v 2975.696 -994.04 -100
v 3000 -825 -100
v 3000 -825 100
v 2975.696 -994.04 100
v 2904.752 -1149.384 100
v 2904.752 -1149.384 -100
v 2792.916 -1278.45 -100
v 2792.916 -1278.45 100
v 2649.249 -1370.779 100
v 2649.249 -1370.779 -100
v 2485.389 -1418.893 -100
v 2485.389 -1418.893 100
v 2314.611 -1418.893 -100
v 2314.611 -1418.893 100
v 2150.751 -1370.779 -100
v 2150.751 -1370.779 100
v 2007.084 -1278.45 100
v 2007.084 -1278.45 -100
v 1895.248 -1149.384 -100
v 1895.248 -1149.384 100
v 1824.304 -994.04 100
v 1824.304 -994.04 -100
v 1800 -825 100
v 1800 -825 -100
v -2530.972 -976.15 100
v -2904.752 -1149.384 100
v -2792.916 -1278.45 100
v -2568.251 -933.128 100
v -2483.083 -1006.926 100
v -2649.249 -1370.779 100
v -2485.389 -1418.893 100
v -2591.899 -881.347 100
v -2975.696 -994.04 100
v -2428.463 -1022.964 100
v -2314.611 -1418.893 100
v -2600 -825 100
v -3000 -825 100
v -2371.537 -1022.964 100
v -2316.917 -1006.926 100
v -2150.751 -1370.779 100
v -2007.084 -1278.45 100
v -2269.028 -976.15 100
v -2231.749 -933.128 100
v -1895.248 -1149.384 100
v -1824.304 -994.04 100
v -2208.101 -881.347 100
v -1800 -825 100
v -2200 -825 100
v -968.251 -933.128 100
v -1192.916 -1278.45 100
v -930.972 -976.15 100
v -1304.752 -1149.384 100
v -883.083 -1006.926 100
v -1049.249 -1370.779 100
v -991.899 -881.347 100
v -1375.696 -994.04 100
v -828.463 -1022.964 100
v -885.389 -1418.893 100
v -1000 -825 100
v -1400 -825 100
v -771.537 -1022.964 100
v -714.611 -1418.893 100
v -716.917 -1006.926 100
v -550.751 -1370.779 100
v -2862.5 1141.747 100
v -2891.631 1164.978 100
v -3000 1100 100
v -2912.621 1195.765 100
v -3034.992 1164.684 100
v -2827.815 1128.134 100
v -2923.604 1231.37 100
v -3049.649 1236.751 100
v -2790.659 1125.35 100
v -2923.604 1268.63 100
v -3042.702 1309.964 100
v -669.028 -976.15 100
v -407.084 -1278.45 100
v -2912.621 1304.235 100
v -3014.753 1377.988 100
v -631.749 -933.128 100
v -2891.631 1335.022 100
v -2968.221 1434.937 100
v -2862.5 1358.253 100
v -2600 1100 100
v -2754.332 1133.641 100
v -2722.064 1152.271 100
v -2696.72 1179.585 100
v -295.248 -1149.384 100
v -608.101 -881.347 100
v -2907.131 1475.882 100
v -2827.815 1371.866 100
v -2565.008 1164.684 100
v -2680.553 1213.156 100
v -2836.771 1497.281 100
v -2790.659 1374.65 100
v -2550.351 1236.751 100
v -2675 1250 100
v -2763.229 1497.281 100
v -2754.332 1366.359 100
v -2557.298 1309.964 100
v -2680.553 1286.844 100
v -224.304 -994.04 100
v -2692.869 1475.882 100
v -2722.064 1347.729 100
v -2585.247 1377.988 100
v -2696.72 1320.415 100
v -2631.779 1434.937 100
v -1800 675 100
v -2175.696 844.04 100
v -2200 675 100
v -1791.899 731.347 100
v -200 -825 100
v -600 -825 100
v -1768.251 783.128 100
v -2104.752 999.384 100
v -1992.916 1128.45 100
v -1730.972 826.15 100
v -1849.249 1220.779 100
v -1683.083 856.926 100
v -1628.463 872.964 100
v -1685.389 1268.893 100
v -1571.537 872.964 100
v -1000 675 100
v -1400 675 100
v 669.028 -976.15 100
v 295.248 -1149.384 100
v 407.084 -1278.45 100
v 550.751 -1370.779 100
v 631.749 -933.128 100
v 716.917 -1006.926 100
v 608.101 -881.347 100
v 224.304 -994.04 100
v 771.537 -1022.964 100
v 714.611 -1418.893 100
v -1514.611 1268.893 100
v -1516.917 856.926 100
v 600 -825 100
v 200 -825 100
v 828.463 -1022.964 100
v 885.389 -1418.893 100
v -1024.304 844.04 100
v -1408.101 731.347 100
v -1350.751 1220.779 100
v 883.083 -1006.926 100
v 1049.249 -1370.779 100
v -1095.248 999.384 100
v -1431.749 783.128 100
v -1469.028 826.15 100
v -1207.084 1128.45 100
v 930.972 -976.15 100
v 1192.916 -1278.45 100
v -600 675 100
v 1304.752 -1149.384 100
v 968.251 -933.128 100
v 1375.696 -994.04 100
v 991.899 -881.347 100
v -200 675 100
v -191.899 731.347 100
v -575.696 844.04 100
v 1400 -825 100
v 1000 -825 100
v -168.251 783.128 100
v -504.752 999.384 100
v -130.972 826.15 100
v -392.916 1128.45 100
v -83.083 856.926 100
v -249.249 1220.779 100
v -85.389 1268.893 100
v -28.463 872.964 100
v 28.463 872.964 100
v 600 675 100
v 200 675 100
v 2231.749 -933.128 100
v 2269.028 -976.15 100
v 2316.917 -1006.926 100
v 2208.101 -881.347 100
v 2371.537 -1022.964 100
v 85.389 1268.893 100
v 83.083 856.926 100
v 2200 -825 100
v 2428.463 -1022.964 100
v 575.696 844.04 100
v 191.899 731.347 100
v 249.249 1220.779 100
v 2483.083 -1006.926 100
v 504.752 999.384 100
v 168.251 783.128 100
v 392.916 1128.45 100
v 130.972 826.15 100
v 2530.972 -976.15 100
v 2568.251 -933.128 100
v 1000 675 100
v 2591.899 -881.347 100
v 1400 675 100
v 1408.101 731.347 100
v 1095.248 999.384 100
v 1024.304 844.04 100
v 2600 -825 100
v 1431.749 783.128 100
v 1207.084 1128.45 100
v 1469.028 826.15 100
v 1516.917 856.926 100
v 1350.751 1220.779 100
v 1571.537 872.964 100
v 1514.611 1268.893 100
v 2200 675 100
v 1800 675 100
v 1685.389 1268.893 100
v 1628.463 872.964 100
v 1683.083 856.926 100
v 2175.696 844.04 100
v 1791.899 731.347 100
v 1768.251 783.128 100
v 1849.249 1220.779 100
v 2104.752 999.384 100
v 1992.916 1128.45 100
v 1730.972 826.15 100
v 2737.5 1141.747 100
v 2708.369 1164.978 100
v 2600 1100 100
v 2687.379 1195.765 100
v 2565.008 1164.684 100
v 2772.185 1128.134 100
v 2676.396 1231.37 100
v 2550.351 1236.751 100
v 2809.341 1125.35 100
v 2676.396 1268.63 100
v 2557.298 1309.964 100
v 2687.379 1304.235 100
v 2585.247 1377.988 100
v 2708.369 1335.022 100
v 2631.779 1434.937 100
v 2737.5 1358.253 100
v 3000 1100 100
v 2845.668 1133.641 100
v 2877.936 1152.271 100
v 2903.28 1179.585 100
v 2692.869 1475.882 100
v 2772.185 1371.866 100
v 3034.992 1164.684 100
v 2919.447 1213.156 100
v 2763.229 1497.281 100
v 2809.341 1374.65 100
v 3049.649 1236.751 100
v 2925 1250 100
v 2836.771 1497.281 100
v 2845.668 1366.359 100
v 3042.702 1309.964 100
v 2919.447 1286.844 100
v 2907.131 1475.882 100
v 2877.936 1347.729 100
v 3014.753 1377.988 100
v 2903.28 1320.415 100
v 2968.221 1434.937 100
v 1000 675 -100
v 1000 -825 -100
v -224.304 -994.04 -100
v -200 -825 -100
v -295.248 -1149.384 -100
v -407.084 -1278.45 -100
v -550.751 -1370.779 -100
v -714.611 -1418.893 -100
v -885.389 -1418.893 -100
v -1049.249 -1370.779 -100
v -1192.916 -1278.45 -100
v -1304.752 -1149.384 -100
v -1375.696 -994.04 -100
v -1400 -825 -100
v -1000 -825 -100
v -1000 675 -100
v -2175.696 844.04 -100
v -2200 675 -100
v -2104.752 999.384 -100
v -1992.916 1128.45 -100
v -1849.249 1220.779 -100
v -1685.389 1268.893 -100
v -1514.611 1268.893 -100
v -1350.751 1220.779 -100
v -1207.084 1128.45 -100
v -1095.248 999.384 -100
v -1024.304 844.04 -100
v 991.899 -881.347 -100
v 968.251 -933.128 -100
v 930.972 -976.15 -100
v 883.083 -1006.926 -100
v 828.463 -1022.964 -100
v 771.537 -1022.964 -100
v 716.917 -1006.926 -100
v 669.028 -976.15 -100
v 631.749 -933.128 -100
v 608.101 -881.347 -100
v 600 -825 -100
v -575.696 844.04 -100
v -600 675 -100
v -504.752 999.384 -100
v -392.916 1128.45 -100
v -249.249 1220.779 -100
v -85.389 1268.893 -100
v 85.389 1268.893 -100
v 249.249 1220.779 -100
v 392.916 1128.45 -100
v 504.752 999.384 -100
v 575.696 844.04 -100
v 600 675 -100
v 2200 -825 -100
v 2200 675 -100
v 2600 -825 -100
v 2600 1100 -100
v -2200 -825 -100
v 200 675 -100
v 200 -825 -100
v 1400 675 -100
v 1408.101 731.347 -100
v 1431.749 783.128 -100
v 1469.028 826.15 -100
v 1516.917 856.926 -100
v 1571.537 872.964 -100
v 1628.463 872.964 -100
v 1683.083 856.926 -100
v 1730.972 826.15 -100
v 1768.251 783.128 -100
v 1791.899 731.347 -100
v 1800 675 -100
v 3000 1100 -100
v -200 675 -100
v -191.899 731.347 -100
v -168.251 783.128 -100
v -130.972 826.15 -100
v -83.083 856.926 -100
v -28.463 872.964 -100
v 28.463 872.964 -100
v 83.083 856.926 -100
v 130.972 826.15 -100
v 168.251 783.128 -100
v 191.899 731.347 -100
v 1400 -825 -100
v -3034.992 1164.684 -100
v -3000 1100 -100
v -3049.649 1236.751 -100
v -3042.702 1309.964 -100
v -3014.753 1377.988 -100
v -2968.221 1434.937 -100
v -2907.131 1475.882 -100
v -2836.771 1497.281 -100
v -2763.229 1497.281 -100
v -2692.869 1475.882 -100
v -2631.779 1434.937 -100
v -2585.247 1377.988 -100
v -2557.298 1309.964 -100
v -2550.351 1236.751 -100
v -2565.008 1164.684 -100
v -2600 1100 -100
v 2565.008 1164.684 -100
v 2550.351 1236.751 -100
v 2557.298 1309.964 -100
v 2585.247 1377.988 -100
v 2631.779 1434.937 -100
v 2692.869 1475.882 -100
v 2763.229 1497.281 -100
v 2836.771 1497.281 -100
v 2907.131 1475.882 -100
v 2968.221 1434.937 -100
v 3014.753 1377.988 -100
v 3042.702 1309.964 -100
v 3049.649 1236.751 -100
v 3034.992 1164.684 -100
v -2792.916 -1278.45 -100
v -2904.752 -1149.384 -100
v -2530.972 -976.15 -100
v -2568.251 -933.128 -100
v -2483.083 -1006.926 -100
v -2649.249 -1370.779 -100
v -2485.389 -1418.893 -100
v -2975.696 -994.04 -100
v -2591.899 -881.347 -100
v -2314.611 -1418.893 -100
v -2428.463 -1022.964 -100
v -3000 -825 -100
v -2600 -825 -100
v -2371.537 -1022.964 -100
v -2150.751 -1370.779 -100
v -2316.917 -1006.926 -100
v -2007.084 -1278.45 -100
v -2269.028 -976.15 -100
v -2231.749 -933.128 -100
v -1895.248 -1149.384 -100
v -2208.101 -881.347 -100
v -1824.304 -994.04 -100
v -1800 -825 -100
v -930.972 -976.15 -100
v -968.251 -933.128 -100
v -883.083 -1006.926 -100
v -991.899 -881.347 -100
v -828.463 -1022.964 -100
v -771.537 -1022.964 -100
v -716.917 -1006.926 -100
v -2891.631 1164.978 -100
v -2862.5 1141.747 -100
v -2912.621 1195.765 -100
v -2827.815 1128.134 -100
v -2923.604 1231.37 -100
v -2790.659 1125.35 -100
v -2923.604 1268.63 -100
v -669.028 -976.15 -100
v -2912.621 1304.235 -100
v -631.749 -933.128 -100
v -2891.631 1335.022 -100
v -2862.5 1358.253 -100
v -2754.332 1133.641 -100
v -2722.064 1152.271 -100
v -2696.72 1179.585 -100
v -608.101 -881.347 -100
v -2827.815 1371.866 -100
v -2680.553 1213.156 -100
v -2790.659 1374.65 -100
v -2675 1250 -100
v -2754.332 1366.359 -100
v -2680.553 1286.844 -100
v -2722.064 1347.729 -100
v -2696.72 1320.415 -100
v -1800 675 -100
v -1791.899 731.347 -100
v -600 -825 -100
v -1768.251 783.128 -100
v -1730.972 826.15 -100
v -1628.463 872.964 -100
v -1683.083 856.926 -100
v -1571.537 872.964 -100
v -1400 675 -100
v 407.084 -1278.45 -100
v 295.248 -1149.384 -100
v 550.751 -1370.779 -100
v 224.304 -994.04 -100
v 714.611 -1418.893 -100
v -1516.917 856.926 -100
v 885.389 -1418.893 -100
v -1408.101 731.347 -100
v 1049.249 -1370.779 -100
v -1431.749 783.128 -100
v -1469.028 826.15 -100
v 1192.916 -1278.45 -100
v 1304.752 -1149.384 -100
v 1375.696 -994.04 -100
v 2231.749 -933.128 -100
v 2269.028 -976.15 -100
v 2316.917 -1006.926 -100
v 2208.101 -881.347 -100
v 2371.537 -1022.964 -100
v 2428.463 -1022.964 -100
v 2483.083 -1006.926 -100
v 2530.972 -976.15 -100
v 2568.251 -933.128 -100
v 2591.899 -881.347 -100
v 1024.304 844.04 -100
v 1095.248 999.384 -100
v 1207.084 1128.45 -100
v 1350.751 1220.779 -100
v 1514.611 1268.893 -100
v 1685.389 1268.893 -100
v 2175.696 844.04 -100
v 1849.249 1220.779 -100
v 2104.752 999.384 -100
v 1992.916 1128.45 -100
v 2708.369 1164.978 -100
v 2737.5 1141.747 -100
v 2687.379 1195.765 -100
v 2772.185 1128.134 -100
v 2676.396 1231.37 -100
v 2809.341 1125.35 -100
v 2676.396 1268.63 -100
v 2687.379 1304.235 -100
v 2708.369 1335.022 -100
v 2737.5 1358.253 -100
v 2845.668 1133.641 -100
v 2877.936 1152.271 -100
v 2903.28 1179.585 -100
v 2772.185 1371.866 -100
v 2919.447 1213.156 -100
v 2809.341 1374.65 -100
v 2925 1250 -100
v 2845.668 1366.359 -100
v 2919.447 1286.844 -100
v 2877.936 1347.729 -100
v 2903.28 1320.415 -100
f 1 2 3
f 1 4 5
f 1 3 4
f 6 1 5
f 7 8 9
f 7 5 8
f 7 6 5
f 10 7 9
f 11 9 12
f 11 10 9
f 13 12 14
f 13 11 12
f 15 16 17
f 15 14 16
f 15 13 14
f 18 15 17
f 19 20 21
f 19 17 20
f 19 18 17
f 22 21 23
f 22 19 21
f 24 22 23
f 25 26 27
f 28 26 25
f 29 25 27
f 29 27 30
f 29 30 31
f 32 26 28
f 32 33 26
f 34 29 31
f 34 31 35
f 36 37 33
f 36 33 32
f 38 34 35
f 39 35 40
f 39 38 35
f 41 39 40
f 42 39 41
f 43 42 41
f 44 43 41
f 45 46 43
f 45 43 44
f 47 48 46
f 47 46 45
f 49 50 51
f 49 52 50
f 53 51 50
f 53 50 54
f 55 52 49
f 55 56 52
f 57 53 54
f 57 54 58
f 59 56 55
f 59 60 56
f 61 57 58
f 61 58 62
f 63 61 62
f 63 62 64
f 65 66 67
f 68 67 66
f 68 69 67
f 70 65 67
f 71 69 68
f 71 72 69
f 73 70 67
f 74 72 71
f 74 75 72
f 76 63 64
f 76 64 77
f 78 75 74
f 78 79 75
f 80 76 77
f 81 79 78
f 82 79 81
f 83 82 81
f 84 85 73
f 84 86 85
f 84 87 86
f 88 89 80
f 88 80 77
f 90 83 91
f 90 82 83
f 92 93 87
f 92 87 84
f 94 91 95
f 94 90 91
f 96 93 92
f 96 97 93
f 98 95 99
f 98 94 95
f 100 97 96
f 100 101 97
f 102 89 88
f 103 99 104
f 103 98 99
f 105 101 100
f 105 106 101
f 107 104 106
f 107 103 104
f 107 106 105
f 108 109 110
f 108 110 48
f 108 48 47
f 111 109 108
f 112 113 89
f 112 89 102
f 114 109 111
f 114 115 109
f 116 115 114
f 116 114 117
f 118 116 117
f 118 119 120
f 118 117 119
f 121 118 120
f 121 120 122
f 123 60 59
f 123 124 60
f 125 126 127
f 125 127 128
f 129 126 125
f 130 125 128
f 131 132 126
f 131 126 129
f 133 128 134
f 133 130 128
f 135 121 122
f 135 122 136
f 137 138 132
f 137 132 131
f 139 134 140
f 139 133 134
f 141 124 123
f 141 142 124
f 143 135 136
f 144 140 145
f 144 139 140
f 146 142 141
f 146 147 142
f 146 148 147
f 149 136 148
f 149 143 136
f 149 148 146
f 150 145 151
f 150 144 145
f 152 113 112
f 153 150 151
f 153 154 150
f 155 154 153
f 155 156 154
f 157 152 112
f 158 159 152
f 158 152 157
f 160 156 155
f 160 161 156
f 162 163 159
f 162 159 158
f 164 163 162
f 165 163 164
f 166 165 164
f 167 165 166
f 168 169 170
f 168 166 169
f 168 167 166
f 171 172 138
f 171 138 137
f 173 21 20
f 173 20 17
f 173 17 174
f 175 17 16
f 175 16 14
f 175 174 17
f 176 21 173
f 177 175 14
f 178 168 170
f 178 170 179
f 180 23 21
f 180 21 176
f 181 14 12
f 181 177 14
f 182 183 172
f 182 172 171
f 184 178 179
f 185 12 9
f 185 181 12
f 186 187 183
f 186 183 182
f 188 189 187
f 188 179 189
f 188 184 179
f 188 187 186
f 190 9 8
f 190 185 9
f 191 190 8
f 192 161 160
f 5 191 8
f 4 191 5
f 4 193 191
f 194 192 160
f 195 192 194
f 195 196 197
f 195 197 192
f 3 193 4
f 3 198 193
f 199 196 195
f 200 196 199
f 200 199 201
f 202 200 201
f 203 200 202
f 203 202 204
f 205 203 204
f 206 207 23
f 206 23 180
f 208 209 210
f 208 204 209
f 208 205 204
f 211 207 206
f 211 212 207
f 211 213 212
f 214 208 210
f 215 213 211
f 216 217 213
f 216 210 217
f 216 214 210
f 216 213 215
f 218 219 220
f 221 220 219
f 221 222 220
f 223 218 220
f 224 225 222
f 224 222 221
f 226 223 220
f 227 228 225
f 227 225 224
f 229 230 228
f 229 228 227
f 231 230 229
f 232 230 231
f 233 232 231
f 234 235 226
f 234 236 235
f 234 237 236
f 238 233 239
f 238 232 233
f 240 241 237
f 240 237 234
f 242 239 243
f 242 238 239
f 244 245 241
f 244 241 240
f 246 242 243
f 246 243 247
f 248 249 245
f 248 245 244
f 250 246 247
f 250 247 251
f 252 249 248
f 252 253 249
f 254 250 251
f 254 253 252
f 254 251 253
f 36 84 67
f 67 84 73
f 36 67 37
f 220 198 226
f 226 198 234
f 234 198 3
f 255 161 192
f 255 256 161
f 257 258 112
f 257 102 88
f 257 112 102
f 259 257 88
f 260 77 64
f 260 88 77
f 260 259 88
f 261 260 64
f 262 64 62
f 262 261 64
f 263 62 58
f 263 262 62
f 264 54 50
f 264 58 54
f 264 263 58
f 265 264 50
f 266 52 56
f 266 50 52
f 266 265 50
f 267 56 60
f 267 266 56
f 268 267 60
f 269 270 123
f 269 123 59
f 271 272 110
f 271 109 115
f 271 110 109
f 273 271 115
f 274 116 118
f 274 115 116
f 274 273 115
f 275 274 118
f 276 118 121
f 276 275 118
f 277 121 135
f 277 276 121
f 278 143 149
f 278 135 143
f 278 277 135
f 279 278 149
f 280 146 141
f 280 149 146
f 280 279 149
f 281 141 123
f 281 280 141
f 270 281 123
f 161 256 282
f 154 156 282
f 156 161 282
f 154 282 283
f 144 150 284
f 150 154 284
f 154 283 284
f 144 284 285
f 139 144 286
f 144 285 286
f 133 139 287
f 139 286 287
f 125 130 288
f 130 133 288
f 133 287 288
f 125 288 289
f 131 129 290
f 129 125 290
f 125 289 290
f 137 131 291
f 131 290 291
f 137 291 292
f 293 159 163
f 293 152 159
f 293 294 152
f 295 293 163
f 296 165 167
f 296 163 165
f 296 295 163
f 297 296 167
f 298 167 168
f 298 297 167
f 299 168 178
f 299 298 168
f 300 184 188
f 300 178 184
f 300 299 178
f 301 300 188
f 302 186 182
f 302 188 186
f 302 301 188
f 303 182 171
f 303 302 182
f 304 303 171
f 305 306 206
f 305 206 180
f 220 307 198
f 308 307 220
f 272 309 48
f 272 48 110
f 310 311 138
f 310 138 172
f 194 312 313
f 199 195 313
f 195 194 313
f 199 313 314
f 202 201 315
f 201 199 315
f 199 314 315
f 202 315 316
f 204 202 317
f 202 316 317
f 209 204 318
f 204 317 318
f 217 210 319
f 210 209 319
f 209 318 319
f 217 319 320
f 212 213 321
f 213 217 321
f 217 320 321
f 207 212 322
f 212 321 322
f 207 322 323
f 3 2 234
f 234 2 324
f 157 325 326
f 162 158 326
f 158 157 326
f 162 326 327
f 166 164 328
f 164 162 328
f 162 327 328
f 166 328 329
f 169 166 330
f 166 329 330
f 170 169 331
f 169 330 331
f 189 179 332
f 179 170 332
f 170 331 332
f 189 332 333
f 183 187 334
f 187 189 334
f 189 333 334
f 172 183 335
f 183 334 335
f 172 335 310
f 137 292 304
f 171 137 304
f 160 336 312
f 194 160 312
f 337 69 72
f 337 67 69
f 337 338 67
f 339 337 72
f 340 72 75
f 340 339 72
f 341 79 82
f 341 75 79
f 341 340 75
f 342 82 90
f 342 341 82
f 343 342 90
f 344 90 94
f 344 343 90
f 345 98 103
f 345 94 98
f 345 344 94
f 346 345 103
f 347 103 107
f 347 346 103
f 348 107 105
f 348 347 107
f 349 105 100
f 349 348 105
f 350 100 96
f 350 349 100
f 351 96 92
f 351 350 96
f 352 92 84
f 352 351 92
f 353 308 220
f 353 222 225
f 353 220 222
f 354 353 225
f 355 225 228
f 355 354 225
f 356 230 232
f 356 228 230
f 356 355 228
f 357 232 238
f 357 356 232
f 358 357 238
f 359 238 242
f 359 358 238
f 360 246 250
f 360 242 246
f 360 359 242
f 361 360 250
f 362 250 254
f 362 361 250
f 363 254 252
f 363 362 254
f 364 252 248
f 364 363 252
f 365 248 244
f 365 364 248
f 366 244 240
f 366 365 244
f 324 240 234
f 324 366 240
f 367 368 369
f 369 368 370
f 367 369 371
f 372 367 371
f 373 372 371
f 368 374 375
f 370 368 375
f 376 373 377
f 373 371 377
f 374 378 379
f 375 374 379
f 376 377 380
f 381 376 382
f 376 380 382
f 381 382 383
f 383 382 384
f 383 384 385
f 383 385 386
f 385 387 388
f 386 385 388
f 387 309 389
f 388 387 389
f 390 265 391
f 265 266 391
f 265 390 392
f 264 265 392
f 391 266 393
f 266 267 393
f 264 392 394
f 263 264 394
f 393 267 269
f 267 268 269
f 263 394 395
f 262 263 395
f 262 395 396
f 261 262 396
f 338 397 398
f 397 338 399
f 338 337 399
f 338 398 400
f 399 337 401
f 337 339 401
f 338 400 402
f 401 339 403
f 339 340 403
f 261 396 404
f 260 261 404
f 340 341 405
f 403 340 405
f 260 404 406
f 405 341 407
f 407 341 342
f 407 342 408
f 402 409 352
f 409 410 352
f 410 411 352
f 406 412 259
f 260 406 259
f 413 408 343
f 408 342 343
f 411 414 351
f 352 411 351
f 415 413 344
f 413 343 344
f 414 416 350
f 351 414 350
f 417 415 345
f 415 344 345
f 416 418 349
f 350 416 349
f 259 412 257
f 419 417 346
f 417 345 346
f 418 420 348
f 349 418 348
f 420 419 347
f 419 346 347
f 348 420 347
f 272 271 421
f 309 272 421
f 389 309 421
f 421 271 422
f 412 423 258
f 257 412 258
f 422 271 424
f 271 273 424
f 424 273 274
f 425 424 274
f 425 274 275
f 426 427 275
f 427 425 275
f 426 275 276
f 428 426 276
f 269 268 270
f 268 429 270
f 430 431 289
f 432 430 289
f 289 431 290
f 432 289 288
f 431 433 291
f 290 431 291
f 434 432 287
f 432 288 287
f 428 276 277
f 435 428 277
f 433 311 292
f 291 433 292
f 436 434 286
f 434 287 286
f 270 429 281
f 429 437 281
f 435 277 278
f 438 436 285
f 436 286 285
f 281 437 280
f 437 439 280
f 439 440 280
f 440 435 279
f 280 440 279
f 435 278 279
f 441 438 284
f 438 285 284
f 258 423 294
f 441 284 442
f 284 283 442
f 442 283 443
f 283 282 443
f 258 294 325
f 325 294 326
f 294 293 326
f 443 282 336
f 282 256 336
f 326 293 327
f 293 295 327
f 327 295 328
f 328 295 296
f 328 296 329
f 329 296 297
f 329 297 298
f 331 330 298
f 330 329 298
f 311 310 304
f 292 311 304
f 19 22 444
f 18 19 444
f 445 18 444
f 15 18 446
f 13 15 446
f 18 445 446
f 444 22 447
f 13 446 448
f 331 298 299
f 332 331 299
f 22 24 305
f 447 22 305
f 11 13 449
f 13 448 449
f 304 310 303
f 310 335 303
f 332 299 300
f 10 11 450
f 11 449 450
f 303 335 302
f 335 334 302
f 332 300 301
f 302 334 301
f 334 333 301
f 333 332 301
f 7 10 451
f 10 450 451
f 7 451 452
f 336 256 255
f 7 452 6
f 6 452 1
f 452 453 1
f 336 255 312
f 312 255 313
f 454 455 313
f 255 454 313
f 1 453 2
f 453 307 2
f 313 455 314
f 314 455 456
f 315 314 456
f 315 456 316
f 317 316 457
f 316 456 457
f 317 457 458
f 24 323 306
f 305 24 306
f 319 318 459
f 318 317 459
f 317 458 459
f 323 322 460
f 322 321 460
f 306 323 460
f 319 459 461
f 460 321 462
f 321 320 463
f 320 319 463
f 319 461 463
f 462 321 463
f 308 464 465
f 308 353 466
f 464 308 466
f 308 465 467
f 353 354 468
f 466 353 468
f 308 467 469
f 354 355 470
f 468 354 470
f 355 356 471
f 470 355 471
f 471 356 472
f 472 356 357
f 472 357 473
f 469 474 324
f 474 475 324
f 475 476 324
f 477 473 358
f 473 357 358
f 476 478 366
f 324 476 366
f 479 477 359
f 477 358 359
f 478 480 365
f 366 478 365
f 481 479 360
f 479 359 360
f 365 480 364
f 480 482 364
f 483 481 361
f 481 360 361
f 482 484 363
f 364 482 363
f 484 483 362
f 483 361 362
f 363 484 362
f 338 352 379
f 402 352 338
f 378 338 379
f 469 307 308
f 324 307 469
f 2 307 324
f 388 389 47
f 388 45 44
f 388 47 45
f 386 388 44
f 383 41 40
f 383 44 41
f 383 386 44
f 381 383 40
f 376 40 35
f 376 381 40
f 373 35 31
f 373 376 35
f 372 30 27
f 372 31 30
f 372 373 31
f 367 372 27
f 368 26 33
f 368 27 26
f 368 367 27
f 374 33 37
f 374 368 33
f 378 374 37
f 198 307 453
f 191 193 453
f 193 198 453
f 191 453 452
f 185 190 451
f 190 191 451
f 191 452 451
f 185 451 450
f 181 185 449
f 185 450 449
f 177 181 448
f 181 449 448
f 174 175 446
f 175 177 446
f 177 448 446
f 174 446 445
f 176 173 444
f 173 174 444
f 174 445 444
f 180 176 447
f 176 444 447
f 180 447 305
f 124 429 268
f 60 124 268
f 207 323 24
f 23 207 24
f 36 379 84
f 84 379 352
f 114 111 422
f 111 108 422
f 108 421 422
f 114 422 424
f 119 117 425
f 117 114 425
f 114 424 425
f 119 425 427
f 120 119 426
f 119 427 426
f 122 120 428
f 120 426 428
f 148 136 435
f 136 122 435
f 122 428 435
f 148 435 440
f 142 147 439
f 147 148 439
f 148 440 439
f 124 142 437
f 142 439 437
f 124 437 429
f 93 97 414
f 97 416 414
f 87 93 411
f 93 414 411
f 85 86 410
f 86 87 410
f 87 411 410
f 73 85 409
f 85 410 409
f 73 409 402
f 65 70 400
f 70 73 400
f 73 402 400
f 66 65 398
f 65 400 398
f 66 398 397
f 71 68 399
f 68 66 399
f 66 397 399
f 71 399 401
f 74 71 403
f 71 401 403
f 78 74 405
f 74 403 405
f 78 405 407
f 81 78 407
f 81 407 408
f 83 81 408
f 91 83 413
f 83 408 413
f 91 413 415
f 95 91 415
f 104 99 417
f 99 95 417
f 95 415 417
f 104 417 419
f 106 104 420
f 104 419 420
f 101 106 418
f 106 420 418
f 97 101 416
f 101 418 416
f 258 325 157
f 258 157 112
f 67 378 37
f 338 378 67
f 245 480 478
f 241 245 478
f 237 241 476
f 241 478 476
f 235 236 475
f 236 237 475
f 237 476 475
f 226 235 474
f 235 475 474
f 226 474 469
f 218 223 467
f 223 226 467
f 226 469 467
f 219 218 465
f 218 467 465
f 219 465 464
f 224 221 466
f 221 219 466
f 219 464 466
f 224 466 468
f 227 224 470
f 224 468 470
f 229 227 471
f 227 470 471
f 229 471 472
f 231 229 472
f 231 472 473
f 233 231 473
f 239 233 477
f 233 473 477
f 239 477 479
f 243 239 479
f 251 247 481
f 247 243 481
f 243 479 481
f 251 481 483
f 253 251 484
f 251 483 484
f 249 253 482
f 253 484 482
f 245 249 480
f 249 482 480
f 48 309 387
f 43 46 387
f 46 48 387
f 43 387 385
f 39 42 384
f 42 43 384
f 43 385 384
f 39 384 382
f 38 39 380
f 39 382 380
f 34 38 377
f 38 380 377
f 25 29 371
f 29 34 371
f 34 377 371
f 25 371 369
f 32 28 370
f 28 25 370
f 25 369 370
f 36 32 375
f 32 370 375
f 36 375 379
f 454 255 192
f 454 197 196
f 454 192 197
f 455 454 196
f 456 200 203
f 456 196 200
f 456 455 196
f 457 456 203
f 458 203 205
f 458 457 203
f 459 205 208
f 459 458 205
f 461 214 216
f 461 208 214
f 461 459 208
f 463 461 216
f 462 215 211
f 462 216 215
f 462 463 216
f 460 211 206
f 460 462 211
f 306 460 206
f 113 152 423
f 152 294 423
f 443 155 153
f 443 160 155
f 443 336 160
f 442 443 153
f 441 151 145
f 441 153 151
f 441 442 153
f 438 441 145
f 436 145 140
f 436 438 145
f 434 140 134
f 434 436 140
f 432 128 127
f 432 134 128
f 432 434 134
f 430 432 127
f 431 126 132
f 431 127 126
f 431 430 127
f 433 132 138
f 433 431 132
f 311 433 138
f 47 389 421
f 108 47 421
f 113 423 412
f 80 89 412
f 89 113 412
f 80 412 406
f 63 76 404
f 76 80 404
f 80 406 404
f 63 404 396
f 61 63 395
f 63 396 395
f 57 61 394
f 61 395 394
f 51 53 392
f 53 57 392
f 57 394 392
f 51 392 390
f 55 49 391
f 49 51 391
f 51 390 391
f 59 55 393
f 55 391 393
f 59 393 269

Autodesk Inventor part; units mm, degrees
ref_plane "YZ Plane" through (0, 0, 0) normal (1, 0, 0) x (0, 1, 0)
ref_plane "XZ Plane" through (0, 0, 0) normal (0, 1, 0) x (-1, 0, 0)
ref_plane "XY Plane" through (0, 0, 0) normal (0, 0, 1) x (1, 0, 0)
sketch "Esboço1" plane through (0, 0, 0) normal (0, 0, 1) x (1, 0, 0)
  arc A0 (-2600, 1100) -> (-3000, 1100) centre (-2800, 1250) ccw
  line L0 (-2800, 1250) -> (-2800, -825) construction
  line L1 (-3000, -825) -> (-3000, 1100)
  line L2 (-2600, -825) -> (-2600, 1100)
  arc A1 (-2600, -825) -> (-2200, -825) centre (-2400, -825) ccw
  circle A2 centre (-2400, -825) radius 600 construction
  arc A3 (-3000, -825) -> (-1800, -825) centre (-2400, -825) ccw
  line L3 (-2200, -825) -> (-2200, 675)
  line L4 (-1800, -825) -> (-1800, 675)
  arc A4 (-1400, 675) -> (-1800, 675) centre (-1600, 675) ccw
  circle A5 centre (-1600, 675) radius 600 construction
  arc A6 (-1000, 675) -> (-2200, 675) centre (-1600, 675) ccw
  line L5 (-1400, 675) -> (-1400, -825)
  line L6 (-1000, 675) -> (-1000, -825)
  arc A7 (-1000, -825) -> (-600, -825) centre (-800, -825) ccw
  circle A8 centre (-800, -825) radius 600 construction
  arc A9 (-1400, -825) -> (-200, -825) centre (-800, -825) ccw
  line L7 (600, -825) -> (600, 675)
  line L8 (200, -825) -> (200, 675)
  arc A10 (200, 675) -> (-200, 675) centre (0, 675) ccw
  circle A11 centre (0, 675) radius 600 construction
  arc A12 (600, 675) -> (-600, 675) centre (0, 675) ccw
  line L9 (-200, 675) -> (-200, -825)
  line L10 (-600, 675) -> (-600, -825)
  circle A13 centre (800, -825) radius 600 construction
  arc A14 (600, -825) -> (1000, -825) centre (800, -825) ccw
  arc A15 (200, -825) -> (1400, -825) centre (800, -825) ccw
  line L11 (1000, -825) -> (1000, 675)
  line L12 (1400, -825) -> (1400, 675)
  circle A16 centre (1600, 675) radius 200 construction
  arc A17 (1800, 675) -> (1400, 675) centre (1600, 675) ccw
  circle A18 centre (1600, 675) radius 600 construction
  arc A19 (2200, 675) -> (1000, 675) centre (1600, 675) ccw
  line L13 (1800, 675) -> (1800, -825)
  line L14 (2200, 675) -> (2200, -825)
  arc A20 (2200, -825) -> (2600, -825) centre (2400, -825) ccw
  arc A21 (1800, -825) -> (3000, -825) centre (2400, -825) ccw
  arc A22 (3000, 1100) -> (2600, 1100) centre (2800, 1250) ccw
  line L15 (2800, 1250) -> (2800, -825) construction
  line L16 (3000, -825) -> (3000, 1100)
  line L17 (2600, -825) -> (2600, 1100)
  circle A23 centre (-2800, 1250) radius 125
  circle A24 centre (2800, 1250) radius 125
  circle A25 centre (2400, -825) radius 200 construction
  circle A26 centre (2400, -825) radius 600 construction
  point P0 (0, 0)
  point P1 (-600, 675)
  point P2 (-1000, 675)
  dimension "d36" = 1500
  dimension "d46" = 250
  dimension "d47" = 250
extrude "Extrusão1" add sketch "Esboço1" along normal mid plane 200
properties part number "sensor2"
